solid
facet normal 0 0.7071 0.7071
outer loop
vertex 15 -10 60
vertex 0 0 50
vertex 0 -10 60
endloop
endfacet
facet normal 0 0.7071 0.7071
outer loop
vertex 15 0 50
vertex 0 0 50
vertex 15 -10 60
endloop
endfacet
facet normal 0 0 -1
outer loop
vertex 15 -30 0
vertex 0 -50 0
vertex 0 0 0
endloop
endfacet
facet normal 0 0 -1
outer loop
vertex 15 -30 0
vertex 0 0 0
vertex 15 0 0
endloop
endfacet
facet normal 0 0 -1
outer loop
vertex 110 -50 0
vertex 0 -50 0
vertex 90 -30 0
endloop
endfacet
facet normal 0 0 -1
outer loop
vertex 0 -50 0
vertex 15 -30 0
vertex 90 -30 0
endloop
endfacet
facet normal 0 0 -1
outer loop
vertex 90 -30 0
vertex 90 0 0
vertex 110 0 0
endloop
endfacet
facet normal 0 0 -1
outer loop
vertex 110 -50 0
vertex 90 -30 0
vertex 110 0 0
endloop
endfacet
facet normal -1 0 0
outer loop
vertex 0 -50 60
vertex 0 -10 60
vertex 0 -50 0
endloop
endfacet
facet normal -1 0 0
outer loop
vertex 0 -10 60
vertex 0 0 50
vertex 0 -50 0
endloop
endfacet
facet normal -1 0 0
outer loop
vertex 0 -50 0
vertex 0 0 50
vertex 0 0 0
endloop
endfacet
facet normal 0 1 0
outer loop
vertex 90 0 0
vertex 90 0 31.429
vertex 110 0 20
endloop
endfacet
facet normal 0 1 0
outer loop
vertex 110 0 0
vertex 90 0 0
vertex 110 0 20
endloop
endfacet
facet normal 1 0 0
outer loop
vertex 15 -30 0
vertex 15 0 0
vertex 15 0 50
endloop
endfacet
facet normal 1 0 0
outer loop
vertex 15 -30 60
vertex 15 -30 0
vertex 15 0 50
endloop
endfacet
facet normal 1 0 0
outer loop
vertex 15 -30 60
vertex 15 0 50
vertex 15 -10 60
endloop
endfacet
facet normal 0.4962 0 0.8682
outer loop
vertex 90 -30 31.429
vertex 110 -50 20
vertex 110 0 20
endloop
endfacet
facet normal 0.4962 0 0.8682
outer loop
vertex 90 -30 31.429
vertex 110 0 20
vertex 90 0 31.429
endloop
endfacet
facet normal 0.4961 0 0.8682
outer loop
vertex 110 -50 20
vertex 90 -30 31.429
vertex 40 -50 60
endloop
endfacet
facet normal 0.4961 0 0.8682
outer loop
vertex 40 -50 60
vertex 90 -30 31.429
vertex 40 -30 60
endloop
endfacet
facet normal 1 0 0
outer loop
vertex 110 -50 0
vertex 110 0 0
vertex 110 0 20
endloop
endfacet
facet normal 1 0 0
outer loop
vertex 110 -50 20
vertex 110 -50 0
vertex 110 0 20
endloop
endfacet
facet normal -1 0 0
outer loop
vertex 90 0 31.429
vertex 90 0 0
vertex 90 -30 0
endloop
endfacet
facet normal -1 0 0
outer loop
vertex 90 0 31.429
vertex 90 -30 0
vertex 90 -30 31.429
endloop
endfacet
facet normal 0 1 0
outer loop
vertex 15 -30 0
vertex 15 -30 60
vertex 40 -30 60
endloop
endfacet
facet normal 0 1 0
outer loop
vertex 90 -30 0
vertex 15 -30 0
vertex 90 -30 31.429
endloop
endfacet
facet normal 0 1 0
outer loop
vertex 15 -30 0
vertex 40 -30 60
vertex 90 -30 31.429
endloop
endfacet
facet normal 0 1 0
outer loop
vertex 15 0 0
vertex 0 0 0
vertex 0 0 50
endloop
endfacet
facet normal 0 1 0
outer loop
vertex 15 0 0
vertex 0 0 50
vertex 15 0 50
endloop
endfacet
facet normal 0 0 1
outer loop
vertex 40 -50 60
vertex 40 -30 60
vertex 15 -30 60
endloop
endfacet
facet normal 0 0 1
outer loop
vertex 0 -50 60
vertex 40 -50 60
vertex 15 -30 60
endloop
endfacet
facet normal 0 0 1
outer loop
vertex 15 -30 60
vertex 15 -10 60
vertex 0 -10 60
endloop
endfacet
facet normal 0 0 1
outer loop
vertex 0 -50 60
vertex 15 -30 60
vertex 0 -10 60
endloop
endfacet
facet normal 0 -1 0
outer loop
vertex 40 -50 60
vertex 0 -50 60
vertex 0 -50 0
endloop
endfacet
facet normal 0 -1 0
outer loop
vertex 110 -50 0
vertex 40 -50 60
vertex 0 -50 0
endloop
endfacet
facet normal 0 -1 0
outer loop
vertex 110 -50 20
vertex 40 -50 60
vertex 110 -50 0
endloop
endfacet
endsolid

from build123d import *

# Parameters (mm, degrees)
F1_DEPTH = 50
F2_W     = 75
F2_H     = 61.672469
F3_DEPTH = 30
F4_DEPTH = 30
F5_DEPTH = 30
F6_SIZE  = 10


with BuildPart() as f1:
    # F0 (on Front) → F1 (new body)
    with BuildSketch(Plane.XZ):
        Polygon((0, 60), (0, 0), (110, 0), (110, 20), (40, 60), align=None)
    extrude(amount=F1_DEPTH)

    # F2 (on Front) → F3 (cut)
    with BuildSketch(Plane.XZ):
        with Locations((52.5, 29.879423)):
            Rectangle(F2_W, F2_H)
    extrude(amount=-F3_DEPTH, mode=Mode.SUBTRACT)

    # F2 (on Front) → F4 (cut)
    with BuildSketch(Plane.XZ):
        with Locations((52.5, 29.879423)):
            Rectangle(F2_W, F2_H)
    extrude(amount=-F4_DEPTH, mode=Mode.SUBTRACT)

    # F2 (on Front) → F5 (cut)
    with BuildSketch(Plane.XZ):
        with Locations((52.5, 29.879423)):
            Rectangle(F2_W, F2_H)
    extrude(amount=F5_DEPTH, mode=Mode.SUBTRACT)

    # F6
    f6_edges = [f1.edges().sort_by_distance(p)[0] for p in [
        (7.5, 0, 60),
    ]]
    chamfer(f6_edges, length=F6_SIZE)


solid = f1.part
